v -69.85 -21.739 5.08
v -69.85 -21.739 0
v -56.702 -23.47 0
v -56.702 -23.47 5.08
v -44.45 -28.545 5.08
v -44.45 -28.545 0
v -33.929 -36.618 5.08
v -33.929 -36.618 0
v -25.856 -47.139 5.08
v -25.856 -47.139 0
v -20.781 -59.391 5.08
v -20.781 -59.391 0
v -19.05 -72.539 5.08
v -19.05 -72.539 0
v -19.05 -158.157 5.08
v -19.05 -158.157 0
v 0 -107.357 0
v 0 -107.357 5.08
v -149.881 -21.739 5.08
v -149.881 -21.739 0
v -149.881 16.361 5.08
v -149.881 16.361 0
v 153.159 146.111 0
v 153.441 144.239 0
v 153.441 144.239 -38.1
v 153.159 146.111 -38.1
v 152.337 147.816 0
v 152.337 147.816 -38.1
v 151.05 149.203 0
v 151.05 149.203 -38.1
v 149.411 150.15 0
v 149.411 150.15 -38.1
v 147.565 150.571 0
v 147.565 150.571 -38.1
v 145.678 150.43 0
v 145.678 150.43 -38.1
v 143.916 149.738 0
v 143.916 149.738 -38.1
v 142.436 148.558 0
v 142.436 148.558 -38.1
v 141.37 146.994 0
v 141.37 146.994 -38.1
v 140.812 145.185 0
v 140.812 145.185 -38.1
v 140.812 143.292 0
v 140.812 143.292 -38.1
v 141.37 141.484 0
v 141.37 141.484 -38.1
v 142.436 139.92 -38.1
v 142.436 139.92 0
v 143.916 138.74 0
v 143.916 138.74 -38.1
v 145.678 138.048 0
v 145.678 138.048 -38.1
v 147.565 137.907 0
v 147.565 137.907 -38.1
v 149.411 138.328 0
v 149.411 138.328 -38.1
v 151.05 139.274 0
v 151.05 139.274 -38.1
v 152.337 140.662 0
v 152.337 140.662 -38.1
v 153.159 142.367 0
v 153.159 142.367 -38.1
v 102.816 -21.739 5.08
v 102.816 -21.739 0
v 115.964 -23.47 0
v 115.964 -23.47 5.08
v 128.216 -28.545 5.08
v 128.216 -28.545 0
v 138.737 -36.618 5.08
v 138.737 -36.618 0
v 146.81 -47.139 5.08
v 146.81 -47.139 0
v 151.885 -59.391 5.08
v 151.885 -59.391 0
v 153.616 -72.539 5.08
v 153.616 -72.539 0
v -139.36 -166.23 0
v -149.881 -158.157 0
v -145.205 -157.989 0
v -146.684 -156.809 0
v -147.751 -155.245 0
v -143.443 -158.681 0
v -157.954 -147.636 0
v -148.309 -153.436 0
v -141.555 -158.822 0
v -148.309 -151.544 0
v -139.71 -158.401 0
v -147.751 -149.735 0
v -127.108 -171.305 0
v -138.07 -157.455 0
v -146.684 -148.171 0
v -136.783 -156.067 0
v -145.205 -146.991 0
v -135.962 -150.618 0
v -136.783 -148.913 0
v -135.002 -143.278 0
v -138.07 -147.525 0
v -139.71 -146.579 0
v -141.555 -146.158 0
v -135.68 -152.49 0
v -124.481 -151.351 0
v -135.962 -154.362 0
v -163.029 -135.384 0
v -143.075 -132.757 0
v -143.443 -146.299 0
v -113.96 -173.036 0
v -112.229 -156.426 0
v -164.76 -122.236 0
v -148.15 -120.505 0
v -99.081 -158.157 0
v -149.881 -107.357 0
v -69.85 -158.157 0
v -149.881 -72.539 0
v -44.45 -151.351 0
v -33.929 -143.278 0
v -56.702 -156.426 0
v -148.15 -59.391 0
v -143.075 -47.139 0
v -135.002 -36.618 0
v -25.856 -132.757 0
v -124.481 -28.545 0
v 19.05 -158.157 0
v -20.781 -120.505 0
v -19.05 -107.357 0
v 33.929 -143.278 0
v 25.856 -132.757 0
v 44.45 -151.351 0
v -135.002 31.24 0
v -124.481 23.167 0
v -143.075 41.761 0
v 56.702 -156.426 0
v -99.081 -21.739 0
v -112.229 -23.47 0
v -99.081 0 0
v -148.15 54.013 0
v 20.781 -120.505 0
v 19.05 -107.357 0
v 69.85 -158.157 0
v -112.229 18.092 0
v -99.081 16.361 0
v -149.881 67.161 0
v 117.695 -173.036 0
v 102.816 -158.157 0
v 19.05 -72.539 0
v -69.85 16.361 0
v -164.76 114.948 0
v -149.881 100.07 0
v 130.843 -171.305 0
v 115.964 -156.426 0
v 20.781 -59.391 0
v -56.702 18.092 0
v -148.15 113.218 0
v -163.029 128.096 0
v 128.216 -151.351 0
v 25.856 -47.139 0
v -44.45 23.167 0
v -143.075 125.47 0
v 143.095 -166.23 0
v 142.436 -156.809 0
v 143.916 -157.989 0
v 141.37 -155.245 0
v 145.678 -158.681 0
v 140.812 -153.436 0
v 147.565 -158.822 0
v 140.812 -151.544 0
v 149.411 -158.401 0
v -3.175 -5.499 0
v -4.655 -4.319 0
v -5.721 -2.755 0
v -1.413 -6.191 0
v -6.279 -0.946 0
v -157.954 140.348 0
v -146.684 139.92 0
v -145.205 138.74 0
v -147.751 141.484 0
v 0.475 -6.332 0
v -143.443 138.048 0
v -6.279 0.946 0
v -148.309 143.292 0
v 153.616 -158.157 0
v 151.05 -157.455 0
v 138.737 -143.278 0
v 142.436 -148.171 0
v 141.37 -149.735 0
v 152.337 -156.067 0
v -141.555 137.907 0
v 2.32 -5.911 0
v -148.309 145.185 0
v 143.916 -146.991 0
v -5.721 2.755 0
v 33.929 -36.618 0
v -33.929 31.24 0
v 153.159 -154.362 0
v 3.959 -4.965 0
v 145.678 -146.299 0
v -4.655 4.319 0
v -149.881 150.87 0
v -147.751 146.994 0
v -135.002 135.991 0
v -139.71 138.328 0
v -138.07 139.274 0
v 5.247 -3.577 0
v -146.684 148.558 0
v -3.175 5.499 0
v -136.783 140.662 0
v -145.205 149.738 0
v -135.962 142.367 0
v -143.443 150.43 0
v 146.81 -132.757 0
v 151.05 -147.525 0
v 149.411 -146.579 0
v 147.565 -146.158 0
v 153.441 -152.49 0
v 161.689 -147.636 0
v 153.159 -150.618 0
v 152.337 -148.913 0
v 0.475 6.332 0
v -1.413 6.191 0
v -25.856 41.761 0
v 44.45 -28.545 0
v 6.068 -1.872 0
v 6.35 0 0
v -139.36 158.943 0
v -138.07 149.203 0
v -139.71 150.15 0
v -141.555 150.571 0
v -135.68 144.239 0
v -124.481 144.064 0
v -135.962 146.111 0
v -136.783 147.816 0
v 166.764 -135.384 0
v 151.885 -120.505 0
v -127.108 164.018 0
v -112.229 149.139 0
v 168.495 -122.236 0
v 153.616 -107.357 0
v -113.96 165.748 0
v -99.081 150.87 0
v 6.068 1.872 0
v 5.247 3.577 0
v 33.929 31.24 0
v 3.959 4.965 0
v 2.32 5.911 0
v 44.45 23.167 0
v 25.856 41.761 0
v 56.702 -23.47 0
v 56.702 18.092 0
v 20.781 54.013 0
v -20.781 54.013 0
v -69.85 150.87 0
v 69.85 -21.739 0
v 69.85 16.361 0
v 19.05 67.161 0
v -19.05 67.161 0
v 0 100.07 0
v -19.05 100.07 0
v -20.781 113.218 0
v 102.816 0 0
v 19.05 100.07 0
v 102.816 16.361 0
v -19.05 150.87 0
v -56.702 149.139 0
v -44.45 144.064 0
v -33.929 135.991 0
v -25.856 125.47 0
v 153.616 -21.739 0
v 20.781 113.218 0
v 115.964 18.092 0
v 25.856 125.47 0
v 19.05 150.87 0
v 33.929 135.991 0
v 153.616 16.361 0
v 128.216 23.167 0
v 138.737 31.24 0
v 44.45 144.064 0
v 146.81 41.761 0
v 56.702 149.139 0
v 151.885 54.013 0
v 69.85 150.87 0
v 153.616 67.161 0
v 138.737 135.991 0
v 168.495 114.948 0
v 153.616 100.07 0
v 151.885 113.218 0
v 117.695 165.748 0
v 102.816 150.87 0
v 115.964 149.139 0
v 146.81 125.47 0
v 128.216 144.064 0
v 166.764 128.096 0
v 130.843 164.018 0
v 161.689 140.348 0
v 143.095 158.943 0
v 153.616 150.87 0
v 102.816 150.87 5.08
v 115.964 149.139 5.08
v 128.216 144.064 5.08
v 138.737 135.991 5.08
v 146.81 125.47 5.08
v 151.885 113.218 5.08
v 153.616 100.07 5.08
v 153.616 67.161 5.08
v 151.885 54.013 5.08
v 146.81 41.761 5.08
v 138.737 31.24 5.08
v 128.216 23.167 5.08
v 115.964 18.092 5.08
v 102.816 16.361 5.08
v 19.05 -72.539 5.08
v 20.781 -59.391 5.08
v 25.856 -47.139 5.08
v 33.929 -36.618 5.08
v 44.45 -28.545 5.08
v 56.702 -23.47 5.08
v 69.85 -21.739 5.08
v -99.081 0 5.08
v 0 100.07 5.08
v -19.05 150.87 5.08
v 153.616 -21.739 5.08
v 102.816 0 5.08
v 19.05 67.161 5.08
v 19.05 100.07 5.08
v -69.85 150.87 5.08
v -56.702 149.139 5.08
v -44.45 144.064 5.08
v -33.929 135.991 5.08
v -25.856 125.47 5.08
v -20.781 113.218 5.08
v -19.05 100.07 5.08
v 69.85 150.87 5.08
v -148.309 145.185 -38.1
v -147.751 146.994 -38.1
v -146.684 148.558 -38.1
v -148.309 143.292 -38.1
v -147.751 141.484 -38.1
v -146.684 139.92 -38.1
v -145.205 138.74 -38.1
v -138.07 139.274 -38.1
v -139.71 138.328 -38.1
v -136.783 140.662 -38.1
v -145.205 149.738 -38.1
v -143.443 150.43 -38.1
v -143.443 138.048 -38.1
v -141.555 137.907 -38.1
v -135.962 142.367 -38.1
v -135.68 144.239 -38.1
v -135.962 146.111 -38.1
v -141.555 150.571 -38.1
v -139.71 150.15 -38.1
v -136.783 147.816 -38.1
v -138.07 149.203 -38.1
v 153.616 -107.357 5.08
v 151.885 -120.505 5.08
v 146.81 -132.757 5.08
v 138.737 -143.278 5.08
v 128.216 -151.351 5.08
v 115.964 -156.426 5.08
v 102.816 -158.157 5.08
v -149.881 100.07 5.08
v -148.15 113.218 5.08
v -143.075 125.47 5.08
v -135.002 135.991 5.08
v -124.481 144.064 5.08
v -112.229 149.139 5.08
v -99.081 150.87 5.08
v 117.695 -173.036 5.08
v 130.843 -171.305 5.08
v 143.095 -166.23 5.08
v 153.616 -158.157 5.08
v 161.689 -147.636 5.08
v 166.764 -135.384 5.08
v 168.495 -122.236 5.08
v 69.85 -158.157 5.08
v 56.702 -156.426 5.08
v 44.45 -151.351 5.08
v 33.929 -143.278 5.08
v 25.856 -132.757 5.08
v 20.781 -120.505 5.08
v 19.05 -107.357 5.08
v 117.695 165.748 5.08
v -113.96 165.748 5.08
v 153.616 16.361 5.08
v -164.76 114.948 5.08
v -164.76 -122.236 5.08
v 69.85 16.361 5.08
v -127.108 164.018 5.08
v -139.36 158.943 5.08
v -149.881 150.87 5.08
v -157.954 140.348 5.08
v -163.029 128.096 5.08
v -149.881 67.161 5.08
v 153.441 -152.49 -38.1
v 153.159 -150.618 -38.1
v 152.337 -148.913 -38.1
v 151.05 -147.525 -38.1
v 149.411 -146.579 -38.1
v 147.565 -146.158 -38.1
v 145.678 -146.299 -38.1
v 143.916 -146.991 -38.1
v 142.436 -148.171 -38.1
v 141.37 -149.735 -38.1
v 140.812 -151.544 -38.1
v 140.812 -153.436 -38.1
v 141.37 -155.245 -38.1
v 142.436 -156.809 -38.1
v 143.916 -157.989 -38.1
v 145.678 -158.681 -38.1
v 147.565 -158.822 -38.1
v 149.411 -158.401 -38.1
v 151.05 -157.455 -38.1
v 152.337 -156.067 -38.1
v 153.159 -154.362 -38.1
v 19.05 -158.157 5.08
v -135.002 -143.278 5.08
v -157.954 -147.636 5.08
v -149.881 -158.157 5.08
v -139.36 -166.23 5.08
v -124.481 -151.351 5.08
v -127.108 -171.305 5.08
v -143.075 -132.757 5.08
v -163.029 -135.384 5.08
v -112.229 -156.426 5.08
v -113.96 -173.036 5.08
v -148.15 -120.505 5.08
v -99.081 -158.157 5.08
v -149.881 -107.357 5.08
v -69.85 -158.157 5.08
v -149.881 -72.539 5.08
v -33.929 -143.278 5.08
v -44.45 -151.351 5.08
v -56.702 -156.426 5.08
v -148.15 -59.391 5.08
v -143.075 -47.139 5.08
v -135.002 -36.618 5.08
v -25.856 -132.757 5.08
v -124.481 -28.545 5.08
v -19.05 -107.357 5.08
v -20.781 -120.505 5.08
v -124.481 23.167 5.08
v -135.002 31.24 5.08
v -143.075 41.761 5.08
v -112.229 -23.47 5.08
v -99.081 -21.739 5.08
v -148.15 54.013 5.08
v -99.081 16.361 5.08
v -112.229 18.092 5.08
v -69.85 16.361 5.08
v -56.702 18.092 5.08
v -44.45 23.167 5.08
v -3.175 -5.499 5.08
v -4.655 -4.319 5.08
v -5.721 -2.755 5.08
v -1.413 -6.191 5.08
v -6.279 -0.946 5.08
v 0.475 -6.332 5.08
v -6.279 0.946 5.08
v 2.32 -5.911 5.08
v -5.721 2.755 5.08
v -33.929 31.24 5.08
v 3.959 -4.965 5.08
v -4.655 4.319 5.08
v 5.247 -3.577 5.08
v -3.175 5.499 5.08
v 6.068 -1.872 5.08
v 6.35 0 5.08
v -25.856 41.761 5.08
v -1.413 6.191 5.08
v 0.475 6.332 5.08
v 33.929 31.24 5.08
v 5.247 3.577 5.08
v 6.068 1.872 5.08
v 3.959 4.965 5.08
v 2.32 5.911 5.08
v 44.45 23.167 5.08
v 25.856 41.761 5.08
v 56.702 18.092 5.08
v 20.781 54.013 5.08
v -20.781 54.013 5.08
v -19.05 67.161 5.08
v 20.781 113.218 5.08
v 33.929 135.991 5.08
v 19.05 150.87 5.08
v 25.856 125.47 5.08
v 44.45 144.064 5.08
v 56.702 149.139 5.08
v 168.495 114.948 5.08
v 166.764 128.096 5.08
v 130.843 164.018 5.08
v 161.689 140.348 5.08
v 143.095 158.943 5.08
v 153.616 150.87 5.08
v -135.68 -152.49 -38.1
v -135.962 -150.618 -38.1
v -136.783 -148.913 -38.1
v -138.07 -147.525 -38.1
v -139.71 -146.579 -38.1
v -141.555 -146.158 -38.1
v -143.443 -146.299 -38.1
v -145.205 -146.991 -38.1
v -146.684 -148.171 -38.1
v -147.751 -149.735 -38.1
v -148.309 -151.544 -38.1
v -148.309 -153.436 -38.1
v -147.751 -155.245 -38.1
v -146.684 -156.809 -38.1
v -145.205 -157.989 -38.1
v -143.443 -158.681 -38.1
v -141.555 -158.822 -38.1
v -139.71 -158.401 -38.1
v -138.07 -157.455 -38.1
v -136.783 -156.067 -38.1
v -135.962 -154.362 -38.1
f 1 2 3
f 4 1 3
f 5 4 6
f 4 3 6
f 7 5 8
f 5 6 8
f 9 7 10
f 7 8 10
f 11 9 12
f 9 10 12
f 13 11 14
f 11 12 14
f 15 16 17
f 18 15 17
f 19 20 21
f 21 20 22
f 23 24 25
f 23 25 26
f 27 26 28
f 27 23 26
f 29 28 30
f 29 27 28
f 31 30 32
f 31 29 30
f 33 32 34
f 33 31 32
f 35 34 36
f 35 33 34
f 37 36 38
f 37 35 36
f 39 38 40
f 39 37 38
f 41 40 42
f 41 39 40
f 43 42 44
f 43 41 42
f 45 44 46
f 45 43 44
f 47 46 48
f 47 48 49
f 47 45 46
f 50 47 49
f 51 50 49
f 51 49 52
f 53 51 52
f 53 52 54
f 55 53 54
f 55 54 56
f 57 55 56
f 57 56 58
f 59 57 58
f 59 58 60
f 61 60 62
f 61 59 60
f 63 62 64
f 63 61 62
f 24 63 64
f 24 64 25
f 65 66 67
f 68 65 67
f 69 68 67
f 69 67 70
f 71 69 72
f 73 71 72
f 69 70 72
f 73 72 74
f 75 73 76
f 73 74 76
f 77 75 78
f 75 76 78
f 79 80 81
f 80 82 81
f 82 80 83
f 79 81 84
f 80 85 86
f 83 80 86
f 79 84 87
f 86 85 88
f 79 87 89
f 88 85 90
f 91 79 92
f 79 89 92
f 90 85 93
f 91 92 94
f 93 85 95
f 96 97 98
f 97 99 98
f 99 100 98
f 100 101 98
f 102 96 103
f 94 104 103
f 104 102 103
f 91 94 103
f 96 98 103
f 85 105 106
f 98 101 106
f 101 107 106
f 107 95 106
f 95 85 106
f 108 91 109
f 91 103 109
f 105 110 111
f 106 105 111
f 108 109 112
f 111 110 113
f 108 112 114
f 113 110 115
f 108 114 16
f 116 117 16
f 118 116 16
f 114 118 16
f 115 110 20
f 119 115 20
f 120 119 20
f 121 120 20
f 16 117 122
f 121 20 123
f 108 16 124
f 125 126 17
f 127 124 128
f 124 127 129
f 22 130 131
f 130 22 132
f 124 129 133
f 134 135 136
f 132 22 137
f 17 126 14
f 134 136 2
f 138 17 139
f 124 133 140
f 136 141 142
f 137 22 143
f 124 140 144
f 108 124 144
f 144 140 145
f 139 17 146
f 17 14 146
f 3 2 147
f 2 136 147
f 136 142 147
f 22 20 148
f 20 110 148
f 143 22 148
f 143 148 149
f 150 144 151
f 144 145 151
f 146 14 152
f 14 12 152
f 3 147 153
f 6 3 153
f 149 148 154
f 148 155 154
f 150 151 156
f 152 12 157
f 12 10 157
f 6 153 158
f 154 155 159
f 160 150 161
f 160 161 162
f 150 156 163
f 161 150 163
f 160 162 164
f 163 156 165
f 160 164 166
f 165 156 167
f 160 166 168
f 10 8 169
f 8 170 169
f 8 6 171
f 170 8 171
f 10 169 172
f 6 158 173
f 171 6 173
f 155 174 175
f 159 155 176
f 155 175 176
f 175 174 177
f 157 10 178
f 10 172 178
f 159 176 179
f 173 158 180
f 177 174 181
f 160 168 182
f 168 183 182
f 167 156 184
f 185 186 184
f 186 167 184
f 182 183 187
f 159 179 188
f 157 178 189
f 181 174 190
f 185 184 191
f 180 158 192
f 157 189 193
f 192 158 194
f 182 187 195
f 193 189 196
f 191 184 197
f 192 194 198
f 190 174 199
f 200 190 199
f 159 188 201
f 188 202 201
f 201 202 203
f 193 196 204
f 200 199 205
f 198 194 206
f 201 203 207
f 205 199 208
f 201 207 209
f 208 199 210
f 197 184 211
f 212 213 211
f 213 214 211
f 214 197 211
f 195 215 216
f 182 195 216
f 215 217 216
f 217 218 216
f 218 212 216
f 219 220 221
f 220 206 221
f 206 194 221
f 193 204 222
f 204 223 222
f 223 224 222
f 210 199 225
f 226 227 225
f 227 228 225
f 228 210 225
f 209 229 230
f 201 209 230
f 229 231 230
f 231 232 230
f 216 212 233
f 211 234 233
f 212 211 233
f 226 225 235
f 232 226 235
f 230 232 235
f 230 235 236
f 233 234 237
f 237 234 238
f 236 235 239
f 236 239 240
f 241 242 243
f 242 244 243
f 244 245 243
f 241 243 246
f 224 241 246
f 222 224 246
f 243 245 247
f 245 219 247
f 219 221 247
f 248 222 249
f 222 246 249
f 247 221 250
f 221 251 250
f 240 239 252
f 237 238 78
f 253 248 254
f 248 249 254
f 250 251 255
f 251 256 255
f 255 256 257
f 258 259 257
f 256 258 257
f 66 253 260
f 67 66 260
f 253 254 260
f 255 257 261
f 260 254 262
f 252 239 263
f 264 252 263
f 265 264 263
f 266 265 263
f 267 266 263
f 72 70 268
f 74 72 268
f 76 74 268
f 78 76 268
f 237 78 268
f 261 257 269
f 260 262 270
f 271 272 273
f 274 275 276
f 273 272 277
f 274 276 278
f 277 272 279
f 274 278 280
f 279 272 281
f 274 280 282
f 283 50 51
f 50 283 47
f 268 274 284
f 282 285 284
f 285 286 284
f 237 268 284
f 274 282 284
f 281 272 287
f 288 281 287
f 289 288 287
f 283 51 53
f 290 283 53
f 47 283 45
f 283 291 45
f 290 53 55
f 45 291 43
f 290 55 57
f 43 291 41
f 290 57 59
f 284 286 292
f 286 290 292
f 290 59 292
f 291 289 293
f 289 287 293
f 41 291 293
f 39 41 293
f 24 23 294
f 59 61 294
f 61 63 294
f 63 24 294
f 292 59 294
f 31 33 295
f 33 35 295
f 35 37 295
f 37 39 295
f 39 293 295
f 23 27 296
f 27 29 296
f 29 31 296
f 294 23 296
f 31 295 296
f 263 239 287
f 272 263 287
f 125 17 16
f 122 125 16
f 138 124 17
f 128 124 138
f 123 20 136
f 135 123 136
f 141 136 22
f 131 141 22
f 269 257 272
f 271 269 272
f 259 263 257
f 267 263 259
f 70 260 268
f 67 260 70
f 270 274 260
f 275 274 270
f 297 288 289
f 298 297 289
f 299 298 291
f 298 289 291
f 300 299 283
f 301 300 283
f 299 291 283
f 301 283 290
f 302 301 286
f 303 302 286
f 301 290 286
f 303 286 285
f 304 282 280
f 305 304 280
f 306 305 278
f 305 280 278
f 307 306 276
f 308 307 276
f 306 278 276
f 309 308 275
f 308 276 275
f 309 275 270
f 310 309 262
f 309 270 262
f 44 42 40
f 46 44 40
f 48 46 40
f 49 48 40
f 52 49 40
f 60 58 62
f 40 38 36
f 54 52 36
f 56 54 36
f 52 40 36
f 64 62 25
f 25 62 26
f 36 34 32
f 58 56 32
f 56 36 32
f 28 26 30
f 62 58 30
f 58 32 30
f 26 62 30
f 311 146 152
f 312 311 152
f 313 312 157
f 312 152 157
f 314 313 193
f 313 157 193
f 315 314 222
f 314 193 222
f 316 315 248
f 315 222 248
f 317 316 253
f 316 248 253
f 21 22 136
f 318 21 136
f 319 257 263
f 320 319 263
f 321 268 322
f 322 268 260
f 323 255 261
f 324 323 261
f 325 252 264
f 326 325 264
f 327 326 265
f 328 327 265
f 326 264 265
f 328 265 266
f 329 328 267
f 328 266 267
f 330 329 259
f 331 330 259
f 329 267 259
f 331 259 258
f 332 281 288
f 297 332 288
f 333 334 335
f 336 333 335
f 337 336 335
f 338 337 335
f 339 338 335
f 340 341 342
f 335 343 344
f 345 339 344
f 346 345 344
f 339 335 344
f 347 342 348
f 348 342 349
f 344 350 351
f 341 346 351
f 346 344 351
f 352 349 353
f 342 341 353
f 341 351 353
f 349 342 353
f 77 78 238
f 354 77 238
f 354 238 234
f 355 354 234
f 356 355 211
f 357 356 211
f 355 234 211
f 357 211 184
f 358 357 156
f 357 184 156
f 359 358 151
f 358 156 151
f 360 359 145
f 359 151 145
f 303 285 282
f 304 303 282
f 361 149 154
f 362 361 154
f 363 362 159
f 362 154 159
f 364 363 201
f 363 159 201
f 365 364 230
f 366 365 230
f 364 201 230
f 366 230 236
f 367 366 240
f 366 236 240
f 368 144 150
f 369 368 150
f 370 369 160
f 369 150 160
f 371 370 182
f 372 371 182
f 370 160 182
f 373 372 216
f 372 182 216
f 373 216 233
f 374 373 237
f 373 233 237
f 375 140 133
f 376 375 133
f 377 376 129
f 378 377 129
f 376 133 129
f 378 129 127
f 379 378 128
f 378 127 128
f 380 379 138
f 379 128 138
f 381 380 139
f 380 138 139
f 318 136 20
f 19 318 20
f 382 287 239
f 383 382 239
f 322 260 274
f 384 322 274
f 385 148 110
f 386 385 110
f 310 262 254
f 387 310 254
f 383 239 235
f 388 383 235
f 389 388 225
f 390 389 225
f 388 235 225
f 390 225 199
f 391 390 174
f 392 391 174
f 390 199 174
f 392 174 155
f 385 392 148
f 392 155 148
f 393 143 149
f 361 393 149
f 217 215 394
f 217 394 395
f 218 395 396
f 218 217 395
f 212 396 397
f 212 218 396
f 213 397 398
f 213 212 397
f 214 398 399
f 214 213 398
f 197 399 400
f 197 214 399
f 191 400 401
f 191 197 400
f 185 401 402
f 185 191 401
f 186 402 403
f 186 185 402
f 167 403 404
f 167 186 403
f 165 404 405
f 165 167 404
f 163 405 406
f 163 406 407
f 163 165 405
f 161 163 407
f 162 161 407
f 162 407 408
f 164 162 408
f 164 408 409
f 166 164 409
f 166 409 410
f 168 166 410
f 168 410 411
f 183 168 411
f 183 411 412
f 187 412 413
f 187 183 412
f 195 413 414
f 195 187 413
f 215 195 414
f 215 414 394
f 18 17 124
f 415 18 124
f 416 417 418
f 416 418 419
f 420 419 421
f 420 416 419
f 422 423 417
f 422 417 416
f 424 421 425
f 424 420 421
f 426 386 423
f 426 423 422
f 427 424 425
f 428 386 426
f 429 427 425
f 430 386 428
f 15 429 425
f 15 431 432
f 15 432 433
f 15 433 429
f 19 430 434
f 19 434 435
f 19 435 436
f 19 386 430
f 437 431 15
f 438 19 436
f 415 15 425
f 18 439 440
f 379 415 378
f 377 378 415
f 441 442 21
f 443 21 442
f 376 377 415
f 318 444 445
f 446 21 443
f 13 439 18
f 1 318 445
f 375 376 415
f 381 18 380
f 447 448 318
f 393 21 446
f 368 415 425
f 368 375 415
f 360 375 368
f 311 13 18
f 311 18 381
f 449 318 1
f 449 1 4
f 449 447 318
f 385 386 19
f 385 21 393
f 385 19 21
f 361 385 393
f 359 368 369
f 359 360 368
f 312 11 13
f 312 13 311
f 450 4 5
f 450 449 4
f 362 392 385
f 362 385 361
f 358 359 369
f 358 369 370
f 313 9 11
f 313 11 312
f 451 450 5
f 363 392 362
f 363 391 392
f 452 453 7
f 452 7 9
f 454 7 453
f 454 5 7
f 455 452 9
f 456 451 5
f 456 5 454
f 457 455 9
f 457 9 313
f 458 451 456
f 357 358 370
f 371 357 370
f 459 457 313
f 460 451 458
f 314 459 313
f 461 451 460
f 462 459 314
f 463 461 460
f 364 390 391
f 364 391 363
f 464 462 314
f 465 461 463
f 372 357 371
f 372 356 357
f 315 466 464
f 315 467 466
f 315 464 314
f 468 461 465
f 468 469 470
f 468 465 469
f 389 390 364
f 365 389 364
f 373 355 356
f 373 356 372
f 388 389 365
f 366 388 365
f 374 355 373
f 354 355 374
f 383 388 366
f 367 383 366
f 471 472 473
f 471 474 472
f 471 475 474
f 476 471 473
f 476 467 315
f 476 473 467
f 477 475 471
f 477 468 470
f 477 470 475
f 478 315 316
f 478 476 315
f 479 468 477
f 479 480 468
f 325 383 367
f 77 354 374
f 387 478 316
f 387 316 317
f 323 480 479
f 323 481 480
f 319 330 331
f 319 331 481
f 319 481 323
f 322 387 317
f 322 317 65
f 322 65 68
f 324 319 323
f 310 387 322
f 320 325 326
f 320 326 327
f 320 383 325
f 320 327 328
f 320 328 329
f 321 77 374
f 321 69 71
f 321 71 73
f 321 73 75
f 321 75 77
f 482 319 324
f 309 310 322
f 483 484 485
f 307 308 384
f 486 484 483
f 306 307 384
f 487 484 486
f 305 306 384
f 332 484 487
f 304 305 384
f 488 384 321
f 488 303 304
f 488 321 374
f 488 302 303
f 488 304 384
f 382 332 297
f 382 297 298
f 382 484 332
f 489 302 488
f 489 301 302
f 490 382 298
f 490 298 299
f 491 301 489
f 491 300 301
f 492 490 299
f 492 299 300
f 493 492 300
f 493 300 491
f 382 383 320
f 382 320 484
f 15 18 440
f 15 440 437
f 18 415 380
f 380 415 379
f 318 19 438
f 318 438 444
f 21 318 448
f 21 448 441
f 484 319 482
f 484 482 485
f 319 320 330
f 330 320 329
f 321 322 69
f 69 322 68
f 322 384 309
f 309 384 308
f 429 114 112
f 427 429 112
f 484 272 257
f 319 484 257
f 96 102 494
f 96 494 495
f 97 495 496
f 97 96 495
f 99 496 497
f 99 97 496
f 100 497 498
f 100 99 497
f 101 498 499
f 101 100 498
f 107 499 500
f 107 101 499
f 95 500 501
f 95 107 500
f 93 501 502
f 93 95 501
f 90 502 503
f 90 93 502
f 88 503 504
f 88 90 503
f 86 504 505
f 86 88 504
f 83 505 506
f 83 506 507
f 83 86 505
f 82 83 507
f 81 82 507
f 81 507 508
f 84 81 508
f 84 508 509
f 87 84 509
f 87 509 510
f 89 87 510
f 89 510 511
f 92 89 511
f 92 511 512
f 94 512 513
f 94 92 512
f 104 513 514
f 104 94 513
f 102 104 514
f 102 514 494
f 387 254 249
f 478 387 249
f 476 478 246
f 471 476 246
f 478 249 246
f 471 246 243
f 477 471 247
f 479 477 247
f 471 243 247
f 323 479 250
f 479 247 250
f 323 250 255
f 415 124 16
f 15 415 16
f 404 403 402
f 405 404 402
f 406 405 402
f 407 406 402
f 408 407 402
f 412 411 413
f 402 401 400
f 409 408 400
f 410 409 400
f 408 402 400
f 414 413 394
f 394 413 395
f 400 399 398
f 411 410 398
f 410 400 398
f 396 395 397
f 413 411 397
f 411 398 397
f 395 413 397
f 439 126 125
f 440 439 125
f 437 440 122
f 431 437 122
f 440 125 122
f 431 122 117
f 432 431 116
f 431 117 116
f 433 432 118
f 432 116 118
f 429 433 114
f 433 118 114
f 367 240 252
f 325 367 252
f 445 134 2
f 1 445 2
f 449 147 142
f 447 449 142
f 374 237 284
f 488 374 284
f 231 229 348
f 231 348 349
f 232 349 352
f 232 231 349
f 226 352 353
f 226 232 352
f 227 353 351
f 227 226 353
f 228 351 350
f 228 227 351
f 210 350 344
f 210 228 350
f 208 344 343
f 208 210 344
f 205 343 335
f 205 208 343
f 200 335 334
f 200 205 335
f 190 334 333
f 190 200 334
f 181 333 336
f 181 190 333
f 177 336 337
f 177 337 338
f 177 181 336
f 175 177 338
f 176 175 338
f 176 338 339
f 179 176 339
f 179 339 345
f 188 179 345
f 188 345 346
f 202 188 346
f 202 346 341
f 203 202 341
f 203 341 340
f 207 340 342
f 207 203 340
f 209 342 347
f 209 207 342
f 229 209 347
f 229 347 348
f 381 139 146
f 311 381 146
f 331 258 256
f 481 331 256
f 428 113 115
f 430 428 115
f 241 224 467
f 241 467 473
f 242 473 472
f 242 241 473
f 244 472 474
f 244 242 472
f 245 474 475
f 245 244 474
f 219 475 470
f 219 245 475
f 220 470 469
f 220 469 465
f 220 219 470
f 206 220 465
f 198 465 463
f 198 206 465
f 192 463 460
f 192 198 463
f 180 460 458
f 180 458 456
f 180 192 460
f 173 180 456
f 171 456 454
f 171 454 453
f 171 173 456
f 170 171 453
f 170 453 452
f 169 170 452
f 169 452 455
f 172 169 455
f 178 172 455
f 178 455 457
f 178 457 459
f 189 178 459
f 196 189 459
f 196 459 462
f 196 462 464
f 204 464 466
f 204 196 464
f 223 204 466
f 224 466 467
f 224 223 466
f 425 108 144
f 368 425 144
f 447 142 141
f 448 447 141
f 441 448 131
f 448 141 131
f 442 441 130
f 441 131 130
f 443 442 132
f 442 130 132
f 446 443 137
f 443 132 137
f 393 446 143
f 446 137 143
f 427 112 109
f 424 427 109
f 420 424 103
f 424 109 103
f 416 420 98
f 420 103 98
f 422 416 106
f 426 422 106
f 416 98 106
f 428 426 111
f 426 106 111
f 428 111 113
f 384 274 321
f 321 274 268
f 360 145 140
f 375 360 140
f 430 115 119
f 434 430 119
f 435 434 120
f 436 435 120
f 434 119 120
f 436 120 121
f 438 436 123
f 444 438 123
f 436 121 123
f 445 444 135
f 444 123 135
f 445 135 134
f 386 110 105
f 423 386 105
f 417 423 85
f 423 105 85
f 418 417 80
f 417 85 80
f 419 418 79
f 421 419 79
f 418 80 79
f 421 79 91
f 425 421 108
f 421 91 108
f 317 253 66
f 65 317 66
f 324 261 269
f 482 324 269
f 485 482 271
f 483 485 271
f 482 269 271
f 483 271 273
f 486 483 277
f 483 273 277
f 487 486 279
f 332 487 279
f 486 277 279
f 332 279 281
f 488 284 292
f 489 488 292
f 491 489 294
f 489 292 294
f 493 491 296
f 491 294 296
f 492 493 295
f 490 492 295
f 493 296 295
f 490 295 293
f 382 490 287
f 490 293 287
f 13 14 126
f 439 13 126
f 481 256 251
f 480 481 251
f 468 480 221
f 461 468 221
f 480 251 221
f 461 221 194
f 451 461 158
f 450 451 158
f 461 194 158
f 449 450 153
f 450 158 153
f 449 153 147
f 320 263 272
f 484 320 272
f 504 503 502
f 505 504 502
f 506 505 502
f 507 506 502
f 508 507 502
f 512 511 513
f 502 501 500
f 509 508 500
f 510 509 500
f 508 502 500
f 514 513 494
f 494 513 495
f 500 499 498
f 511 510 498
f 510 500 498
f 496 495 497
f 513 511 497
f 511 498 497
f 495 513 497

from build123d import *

# Parameters (mm, degrees)
F0_R     = 6.35
F1_DEPTH = 5.08
F2_R     = 6.35
F3_DEPTH = 38.1


# Not quite as in the source:
# - a feature names something its author has since deleted; it is built from what else it names


with BuildPart() as f1:
    # F0 (on Top) → F1 (new body)
    with BuildSketch(Plane.XY):
        with BuildLine():
            ThreePointArc((-164.7597998381, -122.2357259512), (-149.8808243223, -158.1567504355), (-113.9597998381, -173.0357259512))
            Line((-113.9597998381, -173.0357259512), (117.6952974319, -173.0357259512))
            ThreePointArc((117.6952974319, -173.0357259512), (153.6163219162, -158.1567504355), (168.4952974319, -122.2357259512))
            Line((168.4952974319, -122.2357259512), (168.4952974319, 114.9484769821))
            ThreePointArc((168.4952974319, 114.9484769821), (153.6163219162, 150.8695014664), (117.6952974319, 165.7484769821))
            Line((117.6952974319, 165.7484769821), (-113.9597998381, 165.7484769821))
            ThreePointArc((-113.9597998381, 165.7484769821), (-149.8808243223, 150.8695014664), (-164.7597998381, 114.9484769821))
            Line((-164.7597998381, 114.9484769821), (-164.7597998381, -122.2357259512))
        make_face()
        with BuildLine():
            ThreePointArc((-69.85, -21.7389110476), (-33.9289755157, -36.6178865633), (-19.05, -72.5389110476))
            Line((-19.05, -72.5389110476), (-19.05, -107.3567504355))
            ThreePointArc((-19.05, -107.3567504355), (-33.9289755157, -143.2777749197), (-69.85, -158.1567504355))
            Line((-69.85, -158.1567504355), (-99.0808243223, -158.1567504355))
            ThreePointArc((-99.0808243223, -158.1567504355), (-135.0018488066, -143.2777749197), (-149.8808243223, -107.3567504355))
            Line((-149.8808243223, -107.3567504355), (-149.8808243223, -72.5389110476))
            ThreePointArc((-149.8808243223, -72.5389110476), (-135.0018488066, -36.6178865633), (-99.0808243223, -21.7389110476))
            Line((-99.0808243223, -21.7389110476), (-69.85, -21.7389110476))
        make_face(mode=Mode.SUBTRACT)
        Polygon((-19.05, -158.1567504355), (0, -107.3567504355), (19.05, -158.1567504355), align=None, mode=Mode.SUBTRACT)
        with BuildLine():
            Line((69.85, -21.7389110476), (102.8163219162, -21.7389110476))
            ThreePointArc((102.8163219162, -21.7389110476), (138.7373464005, -36.6178865633), (153.6163219162, -72.5389110476))
            Line((153.6163219162, -72.5389110476), (153.6163219162, -107.3567504355))
            ThreePointArc((153.6163219162, -107.3567504355), (138.7373464005, -143.2777749197), (102.8163219162, -158.1567504355))
            Line((102.8163219162, -158.1567504355), (69.85, -158.1567504355))
            ThreePointArc((69.85, -158.1567504355), (33.9289755157, -143.2777749197), (19.05, -107.3567504355))
            Line((19.05, -107.3567504355), (19.05, -72.5389110476))
            ThreePointArc((19.05, -72.5389110476), (33.9289755157, -36.6178865633), (69.85, -21.7389110476))
        make_face(mode=Mode.SUBTRACT)
        Polygon((-149.8808243223, -21.7389110476), (-149.8808243223, 16.3610889524), (-99.0808243223, 0), align=None, mode=Mode.SUBTRACT)
        Circle(F0_R, mode=Mode.SUBTRACT)
        with BuildLine():
            ThreePointArc((-69.85, 150.8695014664), (-33.9289755157, 135.9905259507), (-19.05, 100.0695014664))
            Line((-19.05, 100.0695014664), (-19.05, 67.1610889524))
            ThreePointArc((-19.05, 67.1610889524), (-33.9289755157, 31.2400644681), (-69.85, 16.3610889524))
            Line((-69.85, 16.3610889524), (-99.0808243223, 16.3610889524))
            ThreePointArc((-99.0808243223, 16.3610889524), (-135.0018488066, 31.2400644681), (-149.8808243223, 67.1610889524))
            Line((-149.8808243223, 67.1610889524), (-149.8808243223, 100.0695014664))
            ThreePointArc((-149.8808243223, 100.0695014664), (-135.0018488066, 135.9905259507), (-99.0808243223, 150.8695014664))
            Line((-99.0808243223, 150.8695014664), (-69.85, 150.8695014664))
        make_face(mode=Mode.SUBTRACT)
        Polygon((19.05, 150.8695014664), (0, 100.0695014664), (-19.05, 150.8695014664), align=None, mode=Mode.SUBTRACT)
        Polygon((153.6163219162, -21.7389110476), (102.8163219162, 0), (153.6163219162, 16.3610889524), align=None, mode=Mode.SUBTRACT)
        with BuildLine():
            ThreePointArc((153.6163219162, 67.1610889524), (138.7373464005, 31.2400644681), (102.8163219162, 16.3610889524))
            Line((102.8163219162, 16.3610889524), (69.85, 16.3610889524))
            ThreePointArc((69.85, 16.3610889524), (33.9289755157, 31.2400644681), (19.05, 67.1610889524))
            Line((19.05, 67.1610889524), (19.05, 100.0695014664))
            ThreePointArc((19.05, 100.0695014664), (33.9289755157, 135.9905259507), (69.85, 150.8695014664))
            Line((69.85, 150.8695014664), (102.8163219162, 150.8695014664))
            ThreePointArc((102.8163219162, 150.8695014664), (138.7373464005, 135.9905259507), (153.6163219162, 100.0695014664))
            Line((153.6163219162, 100.0695014664), (153.6163219162, 67.1610889524))
        make_face(mode=Mode.SUBTRACT)
    extrude(amount=F1_DEPTH)

    # F2 (on Top) → F3 (join)
    with BuildSketch(Plane.XY):
        with Locations((-142.0295983553, -152.4900346994)):
            Circle(F2_R)
        with Locations((-142.0295983553, 144.2388147116)):
            Circle(F2_R)
        with Locations((147.0908075571, 144.2388147116)):
            Circle(F2_R)
        with Locations((147.0908075571, -152.4900346994)):
            Circle(F2_R)
    extrude(amount=-F3_DEPTH)


solid = f1.part
